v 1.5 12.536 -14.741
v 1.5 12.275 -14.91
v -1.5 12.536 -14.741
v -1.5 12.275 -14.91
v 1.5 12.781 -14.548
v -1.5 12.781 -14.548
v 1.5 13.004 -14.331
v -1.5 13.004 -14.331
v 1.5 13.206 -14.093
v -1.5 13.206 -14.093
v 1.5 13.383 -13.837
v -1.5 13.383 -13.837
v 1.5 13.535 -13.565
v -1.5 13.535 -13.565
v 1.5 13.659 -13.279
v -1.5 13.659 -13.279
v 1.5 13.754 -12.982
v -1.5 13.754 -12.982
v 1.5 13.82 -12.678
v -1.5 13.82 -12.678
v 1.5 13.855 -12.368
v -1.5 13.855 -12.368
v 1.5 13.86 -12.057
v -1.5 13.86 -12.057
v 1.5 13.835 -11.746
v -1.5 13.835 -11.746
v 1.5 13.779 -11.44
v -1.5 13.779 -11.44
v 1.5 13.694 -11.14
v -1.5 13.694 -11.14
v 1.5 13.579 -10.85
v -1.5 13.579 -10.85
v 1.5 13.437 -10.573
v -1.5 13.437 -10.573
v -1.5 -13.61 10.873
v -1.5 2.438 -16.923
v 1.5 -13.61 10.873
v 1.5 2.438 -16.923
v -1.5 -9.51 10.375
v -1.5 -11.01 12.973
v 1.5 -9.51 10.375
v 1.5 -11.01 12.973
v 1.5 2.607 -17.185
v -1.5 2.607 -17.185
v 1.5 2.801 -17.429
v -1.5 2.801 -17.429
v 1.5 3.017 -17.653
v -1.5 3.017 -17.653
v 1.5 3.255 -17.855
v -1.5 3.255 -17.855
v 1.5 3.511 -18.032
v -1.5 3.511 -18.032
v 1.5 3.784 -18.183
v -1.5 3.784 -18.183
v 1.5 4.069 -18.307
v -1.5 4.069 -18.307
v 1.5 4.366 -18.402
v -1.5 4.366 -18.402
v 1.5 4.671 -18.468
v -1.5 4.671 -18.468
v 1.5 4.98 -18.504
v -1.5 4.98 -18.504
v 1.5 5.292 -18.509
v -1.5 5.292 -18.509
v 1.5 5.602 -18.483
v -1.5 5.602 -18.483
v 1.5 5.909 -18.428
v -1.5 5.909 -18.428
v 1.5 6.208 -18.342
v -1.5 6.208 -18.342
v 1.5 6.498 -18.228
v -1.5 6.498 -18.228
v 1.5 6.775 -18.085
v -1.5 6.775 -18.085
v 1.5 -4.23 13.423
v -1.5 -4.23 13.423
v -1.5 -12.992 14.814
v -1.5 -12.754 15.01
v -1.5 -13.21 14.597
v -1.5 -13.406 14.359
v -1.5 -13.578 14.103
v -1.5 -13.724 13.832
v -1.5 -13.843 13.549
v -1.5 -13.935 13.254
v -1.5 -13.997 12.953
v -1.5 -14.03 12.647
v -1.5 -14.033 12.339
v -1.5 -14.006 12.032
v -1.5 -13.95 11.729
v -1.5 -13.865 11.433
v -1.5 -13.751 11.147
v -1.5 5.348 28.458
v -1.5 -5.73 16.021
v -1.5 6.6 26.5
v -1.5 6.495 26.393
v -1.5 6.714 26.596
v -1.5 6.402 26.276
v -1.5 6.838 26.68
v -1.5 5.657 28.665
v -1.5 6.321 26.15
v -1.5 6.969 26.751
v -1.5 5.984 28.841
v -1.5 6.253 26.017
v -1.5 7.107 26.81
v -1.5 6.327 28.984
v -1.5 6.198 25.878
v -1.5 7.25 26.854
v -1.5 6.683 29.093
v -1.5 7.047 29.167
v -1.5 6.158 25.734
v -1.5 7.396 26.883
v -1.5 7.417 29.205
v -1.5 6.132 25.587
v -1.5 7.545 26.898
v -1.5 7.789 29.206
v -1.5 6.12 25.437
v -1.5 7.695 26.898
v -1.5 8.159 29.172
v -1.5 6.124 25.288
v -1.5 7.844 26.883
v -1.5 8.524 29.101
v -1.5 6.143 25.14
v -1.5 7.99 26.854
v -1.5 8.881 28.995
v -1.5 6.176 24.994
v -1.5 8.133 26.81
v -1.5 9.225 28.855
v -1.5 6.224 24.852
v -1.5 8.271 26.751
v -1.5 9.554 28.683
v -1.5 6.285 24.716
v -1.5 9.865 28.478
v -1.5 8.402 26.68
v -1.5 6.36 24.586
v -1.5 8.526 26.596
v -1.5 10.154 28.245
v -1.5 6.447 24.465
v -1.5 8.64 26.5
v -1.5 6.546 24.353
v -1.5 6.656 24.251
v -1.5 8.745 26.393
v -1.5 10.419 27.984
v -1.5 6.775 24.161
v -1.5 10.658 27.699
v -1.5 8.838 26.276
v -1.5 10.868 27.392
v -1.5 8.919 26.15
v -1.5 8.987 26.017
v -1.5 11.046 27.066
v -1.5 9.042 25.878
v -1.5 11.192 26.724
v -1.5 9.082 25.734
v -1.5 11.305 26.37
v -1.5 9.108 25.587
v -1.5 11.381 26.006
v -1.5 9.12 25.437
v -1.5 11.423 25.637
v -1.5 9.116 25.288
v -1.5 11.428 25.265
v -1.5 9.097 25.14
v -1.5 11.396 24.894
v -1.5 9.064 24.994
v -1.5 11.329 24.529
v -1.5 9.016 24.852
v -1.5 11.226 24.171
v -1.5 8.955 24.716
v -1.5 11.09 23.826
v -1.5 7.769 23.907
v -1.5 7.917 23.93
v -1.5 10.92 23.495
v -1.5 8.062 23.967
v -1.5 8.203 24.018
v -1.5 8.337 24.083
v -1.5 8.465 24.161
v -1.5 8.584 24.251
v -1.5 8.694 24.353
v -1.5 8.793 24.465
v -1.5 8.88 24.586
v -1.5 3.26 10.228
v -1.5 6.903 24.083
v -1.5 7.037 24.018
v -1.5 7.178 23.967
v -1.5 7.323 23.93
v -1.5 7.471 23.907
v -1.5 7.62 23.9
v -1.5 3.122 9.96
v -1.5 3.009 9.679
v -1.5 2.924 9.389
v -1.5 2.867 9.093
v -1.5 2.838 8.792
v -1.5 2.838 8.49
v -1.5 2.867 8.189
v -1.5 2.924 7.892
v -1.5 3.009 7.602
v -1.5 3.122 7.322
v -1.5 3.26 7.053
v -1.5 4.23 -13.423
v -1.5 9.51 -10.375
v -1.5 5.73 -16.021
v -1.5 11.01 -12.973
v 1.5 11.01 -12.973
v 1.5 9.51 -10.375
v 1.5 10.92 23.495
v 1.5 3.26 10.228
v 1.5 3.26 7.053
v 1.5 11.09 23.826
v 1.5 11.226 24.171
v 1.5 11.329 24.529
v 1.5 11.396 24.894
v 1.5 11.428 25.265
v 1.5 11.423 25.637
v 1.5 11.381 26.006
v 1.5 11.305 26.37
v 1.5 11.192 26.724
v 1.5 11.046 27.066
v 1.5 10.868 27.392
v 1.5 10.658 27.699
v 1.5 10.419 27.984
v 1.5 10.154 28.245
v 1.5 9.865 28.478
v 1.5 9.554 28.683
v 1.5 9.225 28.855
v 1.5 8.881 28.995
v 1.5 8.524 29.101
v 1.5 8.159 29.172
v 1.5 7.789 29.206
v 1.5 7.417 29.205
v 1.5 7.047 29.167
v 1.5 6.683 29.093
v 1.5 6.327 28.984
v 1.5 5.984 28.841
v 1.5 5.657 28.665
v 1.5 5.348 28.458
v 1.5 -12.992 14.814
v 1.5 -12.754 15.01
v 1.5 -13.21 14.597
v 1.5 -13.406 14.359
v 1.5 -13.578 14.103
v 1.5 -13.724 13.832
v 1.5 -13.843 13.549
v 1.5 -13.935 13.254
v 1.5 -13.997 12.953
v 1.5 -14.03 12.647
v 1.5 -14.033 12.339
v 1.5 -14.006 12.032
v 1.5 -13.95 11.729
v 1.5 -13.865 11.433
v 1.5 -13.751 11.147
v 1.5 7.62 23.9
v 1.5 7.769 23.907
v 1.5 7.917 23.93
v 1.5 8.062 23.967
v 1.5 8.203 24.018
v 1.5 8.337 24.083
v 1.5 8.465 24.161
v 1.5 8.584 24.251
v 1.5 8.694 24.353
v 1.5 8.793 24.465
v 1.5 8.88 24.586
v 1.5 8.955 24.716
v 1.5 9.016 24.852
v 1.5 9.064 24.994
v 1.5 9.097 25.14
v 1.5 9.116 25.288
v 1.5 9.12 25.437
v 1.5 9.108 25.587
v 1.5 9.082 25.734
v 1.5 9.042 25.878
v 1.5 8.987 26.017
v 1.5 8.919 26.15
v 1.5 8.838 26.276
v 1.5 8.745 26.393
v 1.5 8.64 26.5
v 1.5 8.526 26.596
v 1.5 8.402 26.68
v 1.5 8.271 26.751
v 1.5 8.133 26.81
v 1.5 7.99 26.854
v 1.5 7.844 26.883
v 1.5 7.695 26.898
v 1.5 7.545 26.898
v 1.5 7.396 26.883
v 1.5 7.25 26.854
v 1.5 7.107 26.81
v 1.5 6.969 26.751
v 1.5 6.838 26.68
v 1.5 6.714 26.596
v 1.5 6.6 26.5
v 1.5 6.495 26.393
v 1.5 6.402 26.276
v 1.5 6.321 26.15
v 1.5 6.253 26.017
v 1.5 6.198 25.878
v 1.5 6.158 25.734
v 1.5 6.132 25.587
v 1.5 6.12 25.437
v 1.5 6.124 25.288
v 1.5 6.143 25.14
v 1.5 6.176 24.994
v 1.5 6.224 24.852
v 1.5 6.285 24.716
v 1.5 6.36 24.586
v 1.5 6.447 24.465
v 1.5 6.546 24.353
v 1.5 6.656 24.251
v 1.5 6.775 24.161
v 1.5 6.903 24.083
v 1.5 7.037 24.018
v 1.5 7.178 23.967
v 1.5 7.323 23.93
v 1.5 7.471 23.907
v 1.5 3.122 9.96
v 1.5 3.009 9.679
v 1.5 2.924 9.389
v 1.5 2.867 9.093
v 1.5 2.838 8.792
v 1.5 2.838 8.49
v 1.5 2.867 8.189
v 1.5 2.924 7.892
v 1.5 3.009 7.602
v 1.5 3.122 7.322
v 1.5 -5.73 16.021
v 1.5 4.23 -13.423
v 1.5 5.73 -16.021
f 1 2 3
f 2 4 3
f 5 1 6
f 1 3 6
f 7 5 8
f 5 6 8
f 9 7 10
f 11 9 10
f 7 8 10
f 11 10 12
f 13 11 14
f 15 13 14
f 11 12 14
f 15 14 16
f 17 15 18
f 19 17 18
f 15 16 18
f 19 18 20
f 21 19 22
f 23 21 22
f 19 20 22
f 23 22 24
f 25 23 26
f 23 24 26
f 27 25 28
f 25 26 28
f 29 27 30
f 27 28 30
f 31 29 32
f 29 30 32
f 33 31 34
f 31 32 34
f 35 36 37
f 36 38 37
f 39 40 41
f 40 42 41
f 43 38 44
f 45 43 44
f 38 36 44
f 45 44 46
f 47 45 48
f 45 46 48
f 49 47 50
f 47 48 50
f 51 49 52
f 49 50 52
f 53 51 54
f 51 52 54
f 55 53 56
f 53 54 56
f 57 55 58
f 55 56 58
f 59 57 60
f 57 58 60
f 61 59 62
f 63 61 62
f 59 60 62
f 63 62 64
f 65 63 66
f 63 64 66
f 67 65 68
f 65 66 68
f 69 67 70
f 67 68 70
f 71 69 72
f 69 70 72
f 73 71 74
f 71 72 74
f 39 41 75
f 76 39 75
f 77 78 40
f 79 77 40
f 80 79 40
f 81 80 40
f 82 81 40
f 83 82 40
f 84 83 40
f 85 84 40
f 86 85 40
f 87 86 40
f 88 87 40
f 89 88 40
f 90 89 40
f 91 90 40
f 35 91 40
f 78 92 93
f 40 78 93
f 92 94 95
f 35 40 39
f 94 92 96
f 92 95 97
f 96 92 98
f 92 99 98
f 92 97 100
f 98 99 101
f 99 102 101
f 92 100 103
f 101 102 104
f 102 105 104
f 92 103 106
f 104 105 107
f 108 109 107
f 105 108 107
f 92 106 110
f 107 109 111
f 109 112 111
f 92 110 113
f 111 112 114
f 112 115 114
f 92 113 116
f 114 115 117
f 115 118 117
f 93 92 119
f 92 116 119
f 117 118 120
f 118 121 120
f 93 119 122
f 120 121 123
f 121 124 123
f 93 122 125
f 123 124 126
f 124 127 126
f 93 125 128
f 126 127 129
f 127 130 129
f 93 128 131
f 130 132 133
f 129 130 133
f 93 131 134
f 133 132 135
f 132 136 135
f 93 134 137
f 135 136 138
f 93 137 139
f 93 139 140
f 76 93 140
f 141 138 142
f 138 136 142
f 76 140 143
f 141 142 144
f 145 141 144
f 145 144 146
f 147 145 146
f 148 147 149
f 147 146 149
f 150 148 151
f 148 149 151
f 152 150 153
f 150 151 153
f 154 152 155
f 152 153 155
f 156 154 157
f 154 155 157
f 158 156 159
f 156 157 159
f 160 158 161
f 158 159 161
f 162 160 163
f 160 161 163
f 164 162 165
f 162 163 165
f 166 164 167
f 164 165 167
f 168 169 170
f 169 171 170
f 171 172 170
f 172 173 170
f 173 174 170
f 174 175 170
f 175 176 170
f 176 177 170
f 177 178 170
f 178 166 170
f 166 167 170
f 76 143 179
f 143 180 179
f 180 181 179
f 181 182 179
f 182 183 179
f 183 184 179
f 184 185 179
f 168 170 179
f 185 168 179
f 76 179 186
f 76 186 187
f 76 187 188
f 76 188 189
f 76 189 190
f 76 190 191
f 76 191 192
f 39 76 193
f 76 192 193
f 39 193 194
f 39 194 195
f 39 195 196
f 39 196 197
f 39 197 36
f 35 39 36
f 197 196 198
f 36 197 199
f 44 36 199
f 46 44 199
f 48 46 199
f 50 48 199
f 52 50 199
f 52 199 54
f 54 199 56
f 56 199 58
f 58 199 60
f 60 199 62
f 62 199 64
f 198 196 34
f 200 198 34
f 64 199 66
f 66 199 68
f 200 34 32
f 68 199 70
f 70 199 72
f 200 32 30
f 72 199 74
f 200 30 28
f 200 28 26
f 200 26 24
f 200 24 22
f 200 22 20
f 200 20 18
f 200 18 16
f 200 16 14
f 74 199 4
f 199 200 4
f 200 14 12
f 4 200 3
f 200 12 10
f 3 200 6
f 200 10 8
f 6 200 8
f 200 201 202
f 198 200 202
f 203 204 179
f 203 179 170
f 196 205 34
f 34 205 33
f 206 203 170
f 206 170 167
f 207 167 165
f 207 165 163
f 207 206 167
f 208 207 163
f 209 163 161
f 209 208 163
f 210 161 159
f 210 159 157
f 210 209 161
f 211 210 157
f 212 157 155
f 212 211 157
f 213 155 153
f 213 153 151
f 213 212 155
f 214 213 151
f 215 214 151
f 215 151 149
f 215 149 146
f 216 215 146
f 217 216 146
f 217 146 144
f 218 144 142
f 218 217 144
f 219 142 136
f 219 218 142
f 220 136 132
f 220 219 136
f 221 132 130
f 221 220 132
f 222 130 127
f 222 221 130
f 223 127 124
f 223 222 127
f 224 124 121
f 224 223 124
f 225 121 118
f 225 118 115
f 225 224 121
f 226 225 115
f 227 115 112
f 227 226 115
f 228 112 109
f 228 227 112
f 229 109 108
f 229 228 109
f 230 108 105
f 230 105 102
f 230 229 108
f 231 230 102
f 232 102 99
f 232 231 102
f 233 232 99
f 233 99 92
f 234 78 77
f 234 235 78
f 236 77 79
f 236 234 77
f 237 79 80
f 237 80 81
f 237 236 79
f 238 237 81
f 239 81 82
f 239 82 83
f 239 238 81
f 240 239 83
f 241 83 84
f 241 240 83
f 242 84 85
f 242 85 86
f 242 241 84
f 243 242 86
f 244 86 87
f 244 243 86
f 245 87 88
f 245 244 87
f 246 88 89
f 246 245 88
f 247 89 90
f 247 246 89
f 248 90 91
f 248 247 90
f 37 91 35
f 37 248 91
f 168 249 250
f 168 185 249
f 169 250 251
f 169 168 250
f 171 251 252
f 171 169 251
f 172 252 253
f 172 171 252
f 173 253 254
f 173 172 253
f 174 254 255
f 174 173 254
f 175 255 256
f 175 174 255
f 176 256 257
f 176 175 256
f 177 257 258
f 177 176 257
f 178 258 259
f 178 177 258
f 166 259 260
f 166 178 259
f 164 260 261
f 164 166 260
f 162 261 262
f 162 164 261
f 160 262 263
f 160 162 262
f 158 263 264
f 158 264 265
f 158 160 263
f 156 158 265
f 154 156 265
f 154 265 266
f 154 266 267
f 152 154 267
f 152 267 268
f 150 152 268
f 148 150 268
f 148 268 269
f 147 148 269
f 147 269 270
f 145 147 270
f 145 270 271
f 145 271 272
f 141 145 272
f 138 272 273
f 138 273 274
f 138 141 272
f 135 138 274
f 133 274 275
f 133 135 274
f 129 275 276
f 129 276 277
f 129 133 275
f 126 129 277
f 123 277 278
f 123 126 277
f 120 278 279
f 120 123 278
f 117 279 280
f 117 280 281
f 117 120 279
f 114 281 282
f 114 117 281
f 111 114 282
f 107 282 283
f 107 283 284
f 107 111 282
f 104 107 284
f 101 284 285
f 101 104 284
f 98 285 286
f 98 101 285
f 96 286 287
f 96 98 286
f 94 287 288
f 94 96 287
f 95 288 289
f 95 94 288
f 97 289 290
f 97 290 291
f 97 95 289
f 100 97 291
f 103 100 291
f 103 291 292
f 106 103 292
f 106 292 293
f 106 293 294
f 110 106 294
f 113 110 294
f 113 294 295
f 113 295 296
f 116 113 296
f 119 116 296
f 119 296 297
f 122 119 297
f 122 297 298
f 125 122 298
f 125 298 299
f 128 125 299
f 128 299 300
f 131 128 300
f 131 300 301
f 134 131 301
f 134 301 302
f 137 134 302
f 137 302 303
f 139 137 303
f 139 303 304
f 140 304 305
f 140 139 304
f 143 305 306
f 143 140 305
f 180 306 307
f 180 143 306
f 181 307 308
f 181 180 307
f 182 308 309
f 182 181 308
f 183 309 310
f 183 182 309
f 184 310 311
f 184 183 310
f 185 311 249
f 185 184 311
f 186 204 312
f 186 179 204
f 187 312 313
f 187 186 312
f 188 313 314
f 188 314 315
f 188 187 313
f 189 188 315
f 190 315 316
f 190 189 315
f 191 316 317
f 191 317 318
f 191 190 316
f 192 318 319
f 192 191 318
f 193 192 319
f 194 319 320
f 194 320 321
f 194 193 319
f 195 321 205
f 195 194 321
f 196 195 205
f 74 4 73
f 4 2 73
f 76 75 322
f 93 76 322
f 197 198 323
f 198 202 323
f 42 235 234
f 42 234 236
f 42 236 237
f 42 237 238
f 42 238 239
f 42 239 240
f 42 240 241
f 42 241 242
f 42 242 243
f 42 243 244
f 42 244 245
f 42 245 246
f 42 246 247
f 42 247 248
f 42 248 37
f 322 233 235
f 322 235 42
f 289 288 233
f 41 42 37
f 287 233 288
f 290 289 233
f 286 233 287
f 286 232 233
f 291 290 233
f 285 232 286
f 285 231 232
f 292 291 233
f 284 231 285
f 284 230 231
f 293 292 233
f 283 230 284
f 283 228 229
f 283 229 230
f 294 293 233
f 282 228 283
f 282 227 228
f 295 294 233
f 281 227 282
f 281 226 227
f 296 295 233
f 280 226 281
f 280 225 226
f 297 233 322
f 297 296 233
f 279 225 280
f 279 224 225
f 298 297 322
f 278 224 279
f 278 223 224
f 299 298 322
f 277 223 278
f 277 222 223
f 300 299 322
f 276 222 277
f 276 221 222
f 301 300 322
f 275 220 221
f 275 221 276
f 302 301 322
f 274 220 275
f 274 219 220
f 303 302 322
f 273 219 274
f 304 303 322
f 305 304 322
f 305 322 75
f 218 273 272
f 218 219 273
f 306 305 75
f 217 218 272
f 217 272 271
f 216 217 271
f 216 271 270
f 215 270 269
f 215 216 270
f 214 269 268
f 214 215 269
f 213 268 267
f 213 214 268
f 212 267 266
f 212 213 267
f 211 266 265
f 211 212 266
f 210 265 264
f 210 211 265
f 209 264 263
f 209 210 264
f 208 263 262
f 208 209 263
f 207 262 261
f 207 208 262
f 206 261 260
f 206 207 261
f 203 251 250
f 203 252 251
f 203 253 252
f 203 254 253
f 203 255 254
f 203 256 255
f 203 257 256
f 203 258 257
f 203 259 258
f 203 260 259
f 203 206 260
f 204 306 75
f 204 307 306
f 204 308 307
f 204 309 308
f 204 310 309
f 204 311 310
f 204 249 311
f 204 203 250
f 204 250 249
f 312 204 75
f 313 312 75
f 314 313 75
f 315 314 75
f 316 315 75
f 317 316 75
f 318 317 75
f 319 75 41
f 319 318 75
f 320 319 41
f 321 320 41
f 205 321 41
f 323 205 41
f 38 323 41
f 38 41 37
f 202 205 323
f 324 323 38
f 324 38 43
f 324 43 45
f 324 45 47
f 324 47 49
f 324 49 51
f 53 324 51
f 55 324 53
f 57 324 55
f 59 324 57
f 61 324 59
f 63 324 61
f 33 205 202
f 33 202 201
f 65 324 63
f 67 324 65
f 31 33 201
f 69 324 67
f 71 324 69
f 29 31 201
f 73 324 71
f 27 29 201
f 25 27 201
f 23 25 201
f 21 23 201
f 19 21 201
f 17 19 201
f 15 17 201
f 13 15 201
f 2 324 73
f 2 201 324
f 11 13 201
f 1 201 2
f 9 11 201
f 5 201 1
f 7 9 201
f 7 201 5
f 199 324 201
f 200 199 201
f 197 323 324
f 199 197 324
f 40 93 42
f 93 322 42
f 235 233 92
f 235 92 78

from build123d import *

# Parameters (mm, degrees)
BOSS_EXTRUDE1_DEPTH = 1.499997
SKETCH3_R           = 3.81
SKETCH3_R_2         = 1.5
BOSS_EXTRUDE2_DEPTH = 1.499997
BOSS_EXTRUDE3_DEPTH = 2.999994
FILLET1_R           = 3.175


with BuildPart() as part:
    # Sketch2 → Boss-Extrude1 (new, symmetric)
    with BuildSketch(Plane(origin=(0, 0, 0), x_dir=(0, 0, -1), z_dir=(1, 0, 0))):
        Polygon((-19.672783942, -4.025738686), (13.322783942, 15.024261314), (19.672783942, 4.025738686), (-13.322783942, -15.024261314), align=None)
        Polygon((-16.021265259, -5.730354569), (-12.973265259, -11.009645431), (-10.375189048, -9.509645431), (-13.423189048, -4.230354569), align=None, mode=Mode.SUBTRACT)
        Polygon((10.375189048, 9.509645431), (13.423189048, 4.230354569), (16.021265259, 5.730354569), (12.973265259, 11.009645431), align=None, mode=Mode.SUBTRACT)
    extrude(amount=BOSS_EXTRUDE1_DEPTH, both=True)



with BuildPart() as body_2:
    # Sketch3 → Boss-Extrude2 (new, symmetric)
    with BuildSketch(Plane(origin=(0, 0, 0), x_dir=(0, 0, -1), z_dir=(1, 0, 0))):
        with Locations((-25.4, 7.62)):
            Circle(SKETCH3_R)
        with Locations((-25.4, 7.62)):
            Circle(SKETCH3_R_2, mode=Mode.SUBTRACT)
    extrude(amount=BOSS_EXTRUDE2_DEPTH, both=True)


with BuildPart() as part_1:
    add(part.part)

    add(body_2.part)  # Boss-Extrude3 merges body 2
    # Sketch4 → Boss-Extrude3 (add)
    with BuildSketch(Plane(origin=(1.499997, 0, 0), x_dir=(0, 0, -1), z_dir=(1, 0, 0))):
        with BuildLine():
            Line((-28.458311324, 5.347813422), (-13.322783942, -15.024261314))
            Line((-13.322783942, -15.024261314), (-19.672783942, -4.025738686))
            Line((-19.672783942, -4.025738686), (-8.640886423, 2.343530316))
            Line((-8.640886423, 2.343530316), (-23.495, 10.919556788))
            ThreePointArc((-23.495, 10.919556788), (-22.100443212, 9.525), (-21.59, 7.62))
            ThreePointArc((-21.59, 7.62), (-24.203351794, 4.002800383), (-28.458311324, 5.347813422))
        make_face()
    extrude(amount=-BOSS_EXTRUDE3_DEPTH)

    # Fillet1
    fillet1_edges = [part_1.edges().sort_by_distance(p)[0] for p in [
        (0, 2.343530316, 8.640886423),
        (0, 15.024261314, -13.322783942),
        (0, 4.025738686, -19.672783942),
        (0, -15.024261314, 13.322783942),
    ]]
    fillet(fillet1_edges, radius=FILLET1_R)


solid = part_1.part
